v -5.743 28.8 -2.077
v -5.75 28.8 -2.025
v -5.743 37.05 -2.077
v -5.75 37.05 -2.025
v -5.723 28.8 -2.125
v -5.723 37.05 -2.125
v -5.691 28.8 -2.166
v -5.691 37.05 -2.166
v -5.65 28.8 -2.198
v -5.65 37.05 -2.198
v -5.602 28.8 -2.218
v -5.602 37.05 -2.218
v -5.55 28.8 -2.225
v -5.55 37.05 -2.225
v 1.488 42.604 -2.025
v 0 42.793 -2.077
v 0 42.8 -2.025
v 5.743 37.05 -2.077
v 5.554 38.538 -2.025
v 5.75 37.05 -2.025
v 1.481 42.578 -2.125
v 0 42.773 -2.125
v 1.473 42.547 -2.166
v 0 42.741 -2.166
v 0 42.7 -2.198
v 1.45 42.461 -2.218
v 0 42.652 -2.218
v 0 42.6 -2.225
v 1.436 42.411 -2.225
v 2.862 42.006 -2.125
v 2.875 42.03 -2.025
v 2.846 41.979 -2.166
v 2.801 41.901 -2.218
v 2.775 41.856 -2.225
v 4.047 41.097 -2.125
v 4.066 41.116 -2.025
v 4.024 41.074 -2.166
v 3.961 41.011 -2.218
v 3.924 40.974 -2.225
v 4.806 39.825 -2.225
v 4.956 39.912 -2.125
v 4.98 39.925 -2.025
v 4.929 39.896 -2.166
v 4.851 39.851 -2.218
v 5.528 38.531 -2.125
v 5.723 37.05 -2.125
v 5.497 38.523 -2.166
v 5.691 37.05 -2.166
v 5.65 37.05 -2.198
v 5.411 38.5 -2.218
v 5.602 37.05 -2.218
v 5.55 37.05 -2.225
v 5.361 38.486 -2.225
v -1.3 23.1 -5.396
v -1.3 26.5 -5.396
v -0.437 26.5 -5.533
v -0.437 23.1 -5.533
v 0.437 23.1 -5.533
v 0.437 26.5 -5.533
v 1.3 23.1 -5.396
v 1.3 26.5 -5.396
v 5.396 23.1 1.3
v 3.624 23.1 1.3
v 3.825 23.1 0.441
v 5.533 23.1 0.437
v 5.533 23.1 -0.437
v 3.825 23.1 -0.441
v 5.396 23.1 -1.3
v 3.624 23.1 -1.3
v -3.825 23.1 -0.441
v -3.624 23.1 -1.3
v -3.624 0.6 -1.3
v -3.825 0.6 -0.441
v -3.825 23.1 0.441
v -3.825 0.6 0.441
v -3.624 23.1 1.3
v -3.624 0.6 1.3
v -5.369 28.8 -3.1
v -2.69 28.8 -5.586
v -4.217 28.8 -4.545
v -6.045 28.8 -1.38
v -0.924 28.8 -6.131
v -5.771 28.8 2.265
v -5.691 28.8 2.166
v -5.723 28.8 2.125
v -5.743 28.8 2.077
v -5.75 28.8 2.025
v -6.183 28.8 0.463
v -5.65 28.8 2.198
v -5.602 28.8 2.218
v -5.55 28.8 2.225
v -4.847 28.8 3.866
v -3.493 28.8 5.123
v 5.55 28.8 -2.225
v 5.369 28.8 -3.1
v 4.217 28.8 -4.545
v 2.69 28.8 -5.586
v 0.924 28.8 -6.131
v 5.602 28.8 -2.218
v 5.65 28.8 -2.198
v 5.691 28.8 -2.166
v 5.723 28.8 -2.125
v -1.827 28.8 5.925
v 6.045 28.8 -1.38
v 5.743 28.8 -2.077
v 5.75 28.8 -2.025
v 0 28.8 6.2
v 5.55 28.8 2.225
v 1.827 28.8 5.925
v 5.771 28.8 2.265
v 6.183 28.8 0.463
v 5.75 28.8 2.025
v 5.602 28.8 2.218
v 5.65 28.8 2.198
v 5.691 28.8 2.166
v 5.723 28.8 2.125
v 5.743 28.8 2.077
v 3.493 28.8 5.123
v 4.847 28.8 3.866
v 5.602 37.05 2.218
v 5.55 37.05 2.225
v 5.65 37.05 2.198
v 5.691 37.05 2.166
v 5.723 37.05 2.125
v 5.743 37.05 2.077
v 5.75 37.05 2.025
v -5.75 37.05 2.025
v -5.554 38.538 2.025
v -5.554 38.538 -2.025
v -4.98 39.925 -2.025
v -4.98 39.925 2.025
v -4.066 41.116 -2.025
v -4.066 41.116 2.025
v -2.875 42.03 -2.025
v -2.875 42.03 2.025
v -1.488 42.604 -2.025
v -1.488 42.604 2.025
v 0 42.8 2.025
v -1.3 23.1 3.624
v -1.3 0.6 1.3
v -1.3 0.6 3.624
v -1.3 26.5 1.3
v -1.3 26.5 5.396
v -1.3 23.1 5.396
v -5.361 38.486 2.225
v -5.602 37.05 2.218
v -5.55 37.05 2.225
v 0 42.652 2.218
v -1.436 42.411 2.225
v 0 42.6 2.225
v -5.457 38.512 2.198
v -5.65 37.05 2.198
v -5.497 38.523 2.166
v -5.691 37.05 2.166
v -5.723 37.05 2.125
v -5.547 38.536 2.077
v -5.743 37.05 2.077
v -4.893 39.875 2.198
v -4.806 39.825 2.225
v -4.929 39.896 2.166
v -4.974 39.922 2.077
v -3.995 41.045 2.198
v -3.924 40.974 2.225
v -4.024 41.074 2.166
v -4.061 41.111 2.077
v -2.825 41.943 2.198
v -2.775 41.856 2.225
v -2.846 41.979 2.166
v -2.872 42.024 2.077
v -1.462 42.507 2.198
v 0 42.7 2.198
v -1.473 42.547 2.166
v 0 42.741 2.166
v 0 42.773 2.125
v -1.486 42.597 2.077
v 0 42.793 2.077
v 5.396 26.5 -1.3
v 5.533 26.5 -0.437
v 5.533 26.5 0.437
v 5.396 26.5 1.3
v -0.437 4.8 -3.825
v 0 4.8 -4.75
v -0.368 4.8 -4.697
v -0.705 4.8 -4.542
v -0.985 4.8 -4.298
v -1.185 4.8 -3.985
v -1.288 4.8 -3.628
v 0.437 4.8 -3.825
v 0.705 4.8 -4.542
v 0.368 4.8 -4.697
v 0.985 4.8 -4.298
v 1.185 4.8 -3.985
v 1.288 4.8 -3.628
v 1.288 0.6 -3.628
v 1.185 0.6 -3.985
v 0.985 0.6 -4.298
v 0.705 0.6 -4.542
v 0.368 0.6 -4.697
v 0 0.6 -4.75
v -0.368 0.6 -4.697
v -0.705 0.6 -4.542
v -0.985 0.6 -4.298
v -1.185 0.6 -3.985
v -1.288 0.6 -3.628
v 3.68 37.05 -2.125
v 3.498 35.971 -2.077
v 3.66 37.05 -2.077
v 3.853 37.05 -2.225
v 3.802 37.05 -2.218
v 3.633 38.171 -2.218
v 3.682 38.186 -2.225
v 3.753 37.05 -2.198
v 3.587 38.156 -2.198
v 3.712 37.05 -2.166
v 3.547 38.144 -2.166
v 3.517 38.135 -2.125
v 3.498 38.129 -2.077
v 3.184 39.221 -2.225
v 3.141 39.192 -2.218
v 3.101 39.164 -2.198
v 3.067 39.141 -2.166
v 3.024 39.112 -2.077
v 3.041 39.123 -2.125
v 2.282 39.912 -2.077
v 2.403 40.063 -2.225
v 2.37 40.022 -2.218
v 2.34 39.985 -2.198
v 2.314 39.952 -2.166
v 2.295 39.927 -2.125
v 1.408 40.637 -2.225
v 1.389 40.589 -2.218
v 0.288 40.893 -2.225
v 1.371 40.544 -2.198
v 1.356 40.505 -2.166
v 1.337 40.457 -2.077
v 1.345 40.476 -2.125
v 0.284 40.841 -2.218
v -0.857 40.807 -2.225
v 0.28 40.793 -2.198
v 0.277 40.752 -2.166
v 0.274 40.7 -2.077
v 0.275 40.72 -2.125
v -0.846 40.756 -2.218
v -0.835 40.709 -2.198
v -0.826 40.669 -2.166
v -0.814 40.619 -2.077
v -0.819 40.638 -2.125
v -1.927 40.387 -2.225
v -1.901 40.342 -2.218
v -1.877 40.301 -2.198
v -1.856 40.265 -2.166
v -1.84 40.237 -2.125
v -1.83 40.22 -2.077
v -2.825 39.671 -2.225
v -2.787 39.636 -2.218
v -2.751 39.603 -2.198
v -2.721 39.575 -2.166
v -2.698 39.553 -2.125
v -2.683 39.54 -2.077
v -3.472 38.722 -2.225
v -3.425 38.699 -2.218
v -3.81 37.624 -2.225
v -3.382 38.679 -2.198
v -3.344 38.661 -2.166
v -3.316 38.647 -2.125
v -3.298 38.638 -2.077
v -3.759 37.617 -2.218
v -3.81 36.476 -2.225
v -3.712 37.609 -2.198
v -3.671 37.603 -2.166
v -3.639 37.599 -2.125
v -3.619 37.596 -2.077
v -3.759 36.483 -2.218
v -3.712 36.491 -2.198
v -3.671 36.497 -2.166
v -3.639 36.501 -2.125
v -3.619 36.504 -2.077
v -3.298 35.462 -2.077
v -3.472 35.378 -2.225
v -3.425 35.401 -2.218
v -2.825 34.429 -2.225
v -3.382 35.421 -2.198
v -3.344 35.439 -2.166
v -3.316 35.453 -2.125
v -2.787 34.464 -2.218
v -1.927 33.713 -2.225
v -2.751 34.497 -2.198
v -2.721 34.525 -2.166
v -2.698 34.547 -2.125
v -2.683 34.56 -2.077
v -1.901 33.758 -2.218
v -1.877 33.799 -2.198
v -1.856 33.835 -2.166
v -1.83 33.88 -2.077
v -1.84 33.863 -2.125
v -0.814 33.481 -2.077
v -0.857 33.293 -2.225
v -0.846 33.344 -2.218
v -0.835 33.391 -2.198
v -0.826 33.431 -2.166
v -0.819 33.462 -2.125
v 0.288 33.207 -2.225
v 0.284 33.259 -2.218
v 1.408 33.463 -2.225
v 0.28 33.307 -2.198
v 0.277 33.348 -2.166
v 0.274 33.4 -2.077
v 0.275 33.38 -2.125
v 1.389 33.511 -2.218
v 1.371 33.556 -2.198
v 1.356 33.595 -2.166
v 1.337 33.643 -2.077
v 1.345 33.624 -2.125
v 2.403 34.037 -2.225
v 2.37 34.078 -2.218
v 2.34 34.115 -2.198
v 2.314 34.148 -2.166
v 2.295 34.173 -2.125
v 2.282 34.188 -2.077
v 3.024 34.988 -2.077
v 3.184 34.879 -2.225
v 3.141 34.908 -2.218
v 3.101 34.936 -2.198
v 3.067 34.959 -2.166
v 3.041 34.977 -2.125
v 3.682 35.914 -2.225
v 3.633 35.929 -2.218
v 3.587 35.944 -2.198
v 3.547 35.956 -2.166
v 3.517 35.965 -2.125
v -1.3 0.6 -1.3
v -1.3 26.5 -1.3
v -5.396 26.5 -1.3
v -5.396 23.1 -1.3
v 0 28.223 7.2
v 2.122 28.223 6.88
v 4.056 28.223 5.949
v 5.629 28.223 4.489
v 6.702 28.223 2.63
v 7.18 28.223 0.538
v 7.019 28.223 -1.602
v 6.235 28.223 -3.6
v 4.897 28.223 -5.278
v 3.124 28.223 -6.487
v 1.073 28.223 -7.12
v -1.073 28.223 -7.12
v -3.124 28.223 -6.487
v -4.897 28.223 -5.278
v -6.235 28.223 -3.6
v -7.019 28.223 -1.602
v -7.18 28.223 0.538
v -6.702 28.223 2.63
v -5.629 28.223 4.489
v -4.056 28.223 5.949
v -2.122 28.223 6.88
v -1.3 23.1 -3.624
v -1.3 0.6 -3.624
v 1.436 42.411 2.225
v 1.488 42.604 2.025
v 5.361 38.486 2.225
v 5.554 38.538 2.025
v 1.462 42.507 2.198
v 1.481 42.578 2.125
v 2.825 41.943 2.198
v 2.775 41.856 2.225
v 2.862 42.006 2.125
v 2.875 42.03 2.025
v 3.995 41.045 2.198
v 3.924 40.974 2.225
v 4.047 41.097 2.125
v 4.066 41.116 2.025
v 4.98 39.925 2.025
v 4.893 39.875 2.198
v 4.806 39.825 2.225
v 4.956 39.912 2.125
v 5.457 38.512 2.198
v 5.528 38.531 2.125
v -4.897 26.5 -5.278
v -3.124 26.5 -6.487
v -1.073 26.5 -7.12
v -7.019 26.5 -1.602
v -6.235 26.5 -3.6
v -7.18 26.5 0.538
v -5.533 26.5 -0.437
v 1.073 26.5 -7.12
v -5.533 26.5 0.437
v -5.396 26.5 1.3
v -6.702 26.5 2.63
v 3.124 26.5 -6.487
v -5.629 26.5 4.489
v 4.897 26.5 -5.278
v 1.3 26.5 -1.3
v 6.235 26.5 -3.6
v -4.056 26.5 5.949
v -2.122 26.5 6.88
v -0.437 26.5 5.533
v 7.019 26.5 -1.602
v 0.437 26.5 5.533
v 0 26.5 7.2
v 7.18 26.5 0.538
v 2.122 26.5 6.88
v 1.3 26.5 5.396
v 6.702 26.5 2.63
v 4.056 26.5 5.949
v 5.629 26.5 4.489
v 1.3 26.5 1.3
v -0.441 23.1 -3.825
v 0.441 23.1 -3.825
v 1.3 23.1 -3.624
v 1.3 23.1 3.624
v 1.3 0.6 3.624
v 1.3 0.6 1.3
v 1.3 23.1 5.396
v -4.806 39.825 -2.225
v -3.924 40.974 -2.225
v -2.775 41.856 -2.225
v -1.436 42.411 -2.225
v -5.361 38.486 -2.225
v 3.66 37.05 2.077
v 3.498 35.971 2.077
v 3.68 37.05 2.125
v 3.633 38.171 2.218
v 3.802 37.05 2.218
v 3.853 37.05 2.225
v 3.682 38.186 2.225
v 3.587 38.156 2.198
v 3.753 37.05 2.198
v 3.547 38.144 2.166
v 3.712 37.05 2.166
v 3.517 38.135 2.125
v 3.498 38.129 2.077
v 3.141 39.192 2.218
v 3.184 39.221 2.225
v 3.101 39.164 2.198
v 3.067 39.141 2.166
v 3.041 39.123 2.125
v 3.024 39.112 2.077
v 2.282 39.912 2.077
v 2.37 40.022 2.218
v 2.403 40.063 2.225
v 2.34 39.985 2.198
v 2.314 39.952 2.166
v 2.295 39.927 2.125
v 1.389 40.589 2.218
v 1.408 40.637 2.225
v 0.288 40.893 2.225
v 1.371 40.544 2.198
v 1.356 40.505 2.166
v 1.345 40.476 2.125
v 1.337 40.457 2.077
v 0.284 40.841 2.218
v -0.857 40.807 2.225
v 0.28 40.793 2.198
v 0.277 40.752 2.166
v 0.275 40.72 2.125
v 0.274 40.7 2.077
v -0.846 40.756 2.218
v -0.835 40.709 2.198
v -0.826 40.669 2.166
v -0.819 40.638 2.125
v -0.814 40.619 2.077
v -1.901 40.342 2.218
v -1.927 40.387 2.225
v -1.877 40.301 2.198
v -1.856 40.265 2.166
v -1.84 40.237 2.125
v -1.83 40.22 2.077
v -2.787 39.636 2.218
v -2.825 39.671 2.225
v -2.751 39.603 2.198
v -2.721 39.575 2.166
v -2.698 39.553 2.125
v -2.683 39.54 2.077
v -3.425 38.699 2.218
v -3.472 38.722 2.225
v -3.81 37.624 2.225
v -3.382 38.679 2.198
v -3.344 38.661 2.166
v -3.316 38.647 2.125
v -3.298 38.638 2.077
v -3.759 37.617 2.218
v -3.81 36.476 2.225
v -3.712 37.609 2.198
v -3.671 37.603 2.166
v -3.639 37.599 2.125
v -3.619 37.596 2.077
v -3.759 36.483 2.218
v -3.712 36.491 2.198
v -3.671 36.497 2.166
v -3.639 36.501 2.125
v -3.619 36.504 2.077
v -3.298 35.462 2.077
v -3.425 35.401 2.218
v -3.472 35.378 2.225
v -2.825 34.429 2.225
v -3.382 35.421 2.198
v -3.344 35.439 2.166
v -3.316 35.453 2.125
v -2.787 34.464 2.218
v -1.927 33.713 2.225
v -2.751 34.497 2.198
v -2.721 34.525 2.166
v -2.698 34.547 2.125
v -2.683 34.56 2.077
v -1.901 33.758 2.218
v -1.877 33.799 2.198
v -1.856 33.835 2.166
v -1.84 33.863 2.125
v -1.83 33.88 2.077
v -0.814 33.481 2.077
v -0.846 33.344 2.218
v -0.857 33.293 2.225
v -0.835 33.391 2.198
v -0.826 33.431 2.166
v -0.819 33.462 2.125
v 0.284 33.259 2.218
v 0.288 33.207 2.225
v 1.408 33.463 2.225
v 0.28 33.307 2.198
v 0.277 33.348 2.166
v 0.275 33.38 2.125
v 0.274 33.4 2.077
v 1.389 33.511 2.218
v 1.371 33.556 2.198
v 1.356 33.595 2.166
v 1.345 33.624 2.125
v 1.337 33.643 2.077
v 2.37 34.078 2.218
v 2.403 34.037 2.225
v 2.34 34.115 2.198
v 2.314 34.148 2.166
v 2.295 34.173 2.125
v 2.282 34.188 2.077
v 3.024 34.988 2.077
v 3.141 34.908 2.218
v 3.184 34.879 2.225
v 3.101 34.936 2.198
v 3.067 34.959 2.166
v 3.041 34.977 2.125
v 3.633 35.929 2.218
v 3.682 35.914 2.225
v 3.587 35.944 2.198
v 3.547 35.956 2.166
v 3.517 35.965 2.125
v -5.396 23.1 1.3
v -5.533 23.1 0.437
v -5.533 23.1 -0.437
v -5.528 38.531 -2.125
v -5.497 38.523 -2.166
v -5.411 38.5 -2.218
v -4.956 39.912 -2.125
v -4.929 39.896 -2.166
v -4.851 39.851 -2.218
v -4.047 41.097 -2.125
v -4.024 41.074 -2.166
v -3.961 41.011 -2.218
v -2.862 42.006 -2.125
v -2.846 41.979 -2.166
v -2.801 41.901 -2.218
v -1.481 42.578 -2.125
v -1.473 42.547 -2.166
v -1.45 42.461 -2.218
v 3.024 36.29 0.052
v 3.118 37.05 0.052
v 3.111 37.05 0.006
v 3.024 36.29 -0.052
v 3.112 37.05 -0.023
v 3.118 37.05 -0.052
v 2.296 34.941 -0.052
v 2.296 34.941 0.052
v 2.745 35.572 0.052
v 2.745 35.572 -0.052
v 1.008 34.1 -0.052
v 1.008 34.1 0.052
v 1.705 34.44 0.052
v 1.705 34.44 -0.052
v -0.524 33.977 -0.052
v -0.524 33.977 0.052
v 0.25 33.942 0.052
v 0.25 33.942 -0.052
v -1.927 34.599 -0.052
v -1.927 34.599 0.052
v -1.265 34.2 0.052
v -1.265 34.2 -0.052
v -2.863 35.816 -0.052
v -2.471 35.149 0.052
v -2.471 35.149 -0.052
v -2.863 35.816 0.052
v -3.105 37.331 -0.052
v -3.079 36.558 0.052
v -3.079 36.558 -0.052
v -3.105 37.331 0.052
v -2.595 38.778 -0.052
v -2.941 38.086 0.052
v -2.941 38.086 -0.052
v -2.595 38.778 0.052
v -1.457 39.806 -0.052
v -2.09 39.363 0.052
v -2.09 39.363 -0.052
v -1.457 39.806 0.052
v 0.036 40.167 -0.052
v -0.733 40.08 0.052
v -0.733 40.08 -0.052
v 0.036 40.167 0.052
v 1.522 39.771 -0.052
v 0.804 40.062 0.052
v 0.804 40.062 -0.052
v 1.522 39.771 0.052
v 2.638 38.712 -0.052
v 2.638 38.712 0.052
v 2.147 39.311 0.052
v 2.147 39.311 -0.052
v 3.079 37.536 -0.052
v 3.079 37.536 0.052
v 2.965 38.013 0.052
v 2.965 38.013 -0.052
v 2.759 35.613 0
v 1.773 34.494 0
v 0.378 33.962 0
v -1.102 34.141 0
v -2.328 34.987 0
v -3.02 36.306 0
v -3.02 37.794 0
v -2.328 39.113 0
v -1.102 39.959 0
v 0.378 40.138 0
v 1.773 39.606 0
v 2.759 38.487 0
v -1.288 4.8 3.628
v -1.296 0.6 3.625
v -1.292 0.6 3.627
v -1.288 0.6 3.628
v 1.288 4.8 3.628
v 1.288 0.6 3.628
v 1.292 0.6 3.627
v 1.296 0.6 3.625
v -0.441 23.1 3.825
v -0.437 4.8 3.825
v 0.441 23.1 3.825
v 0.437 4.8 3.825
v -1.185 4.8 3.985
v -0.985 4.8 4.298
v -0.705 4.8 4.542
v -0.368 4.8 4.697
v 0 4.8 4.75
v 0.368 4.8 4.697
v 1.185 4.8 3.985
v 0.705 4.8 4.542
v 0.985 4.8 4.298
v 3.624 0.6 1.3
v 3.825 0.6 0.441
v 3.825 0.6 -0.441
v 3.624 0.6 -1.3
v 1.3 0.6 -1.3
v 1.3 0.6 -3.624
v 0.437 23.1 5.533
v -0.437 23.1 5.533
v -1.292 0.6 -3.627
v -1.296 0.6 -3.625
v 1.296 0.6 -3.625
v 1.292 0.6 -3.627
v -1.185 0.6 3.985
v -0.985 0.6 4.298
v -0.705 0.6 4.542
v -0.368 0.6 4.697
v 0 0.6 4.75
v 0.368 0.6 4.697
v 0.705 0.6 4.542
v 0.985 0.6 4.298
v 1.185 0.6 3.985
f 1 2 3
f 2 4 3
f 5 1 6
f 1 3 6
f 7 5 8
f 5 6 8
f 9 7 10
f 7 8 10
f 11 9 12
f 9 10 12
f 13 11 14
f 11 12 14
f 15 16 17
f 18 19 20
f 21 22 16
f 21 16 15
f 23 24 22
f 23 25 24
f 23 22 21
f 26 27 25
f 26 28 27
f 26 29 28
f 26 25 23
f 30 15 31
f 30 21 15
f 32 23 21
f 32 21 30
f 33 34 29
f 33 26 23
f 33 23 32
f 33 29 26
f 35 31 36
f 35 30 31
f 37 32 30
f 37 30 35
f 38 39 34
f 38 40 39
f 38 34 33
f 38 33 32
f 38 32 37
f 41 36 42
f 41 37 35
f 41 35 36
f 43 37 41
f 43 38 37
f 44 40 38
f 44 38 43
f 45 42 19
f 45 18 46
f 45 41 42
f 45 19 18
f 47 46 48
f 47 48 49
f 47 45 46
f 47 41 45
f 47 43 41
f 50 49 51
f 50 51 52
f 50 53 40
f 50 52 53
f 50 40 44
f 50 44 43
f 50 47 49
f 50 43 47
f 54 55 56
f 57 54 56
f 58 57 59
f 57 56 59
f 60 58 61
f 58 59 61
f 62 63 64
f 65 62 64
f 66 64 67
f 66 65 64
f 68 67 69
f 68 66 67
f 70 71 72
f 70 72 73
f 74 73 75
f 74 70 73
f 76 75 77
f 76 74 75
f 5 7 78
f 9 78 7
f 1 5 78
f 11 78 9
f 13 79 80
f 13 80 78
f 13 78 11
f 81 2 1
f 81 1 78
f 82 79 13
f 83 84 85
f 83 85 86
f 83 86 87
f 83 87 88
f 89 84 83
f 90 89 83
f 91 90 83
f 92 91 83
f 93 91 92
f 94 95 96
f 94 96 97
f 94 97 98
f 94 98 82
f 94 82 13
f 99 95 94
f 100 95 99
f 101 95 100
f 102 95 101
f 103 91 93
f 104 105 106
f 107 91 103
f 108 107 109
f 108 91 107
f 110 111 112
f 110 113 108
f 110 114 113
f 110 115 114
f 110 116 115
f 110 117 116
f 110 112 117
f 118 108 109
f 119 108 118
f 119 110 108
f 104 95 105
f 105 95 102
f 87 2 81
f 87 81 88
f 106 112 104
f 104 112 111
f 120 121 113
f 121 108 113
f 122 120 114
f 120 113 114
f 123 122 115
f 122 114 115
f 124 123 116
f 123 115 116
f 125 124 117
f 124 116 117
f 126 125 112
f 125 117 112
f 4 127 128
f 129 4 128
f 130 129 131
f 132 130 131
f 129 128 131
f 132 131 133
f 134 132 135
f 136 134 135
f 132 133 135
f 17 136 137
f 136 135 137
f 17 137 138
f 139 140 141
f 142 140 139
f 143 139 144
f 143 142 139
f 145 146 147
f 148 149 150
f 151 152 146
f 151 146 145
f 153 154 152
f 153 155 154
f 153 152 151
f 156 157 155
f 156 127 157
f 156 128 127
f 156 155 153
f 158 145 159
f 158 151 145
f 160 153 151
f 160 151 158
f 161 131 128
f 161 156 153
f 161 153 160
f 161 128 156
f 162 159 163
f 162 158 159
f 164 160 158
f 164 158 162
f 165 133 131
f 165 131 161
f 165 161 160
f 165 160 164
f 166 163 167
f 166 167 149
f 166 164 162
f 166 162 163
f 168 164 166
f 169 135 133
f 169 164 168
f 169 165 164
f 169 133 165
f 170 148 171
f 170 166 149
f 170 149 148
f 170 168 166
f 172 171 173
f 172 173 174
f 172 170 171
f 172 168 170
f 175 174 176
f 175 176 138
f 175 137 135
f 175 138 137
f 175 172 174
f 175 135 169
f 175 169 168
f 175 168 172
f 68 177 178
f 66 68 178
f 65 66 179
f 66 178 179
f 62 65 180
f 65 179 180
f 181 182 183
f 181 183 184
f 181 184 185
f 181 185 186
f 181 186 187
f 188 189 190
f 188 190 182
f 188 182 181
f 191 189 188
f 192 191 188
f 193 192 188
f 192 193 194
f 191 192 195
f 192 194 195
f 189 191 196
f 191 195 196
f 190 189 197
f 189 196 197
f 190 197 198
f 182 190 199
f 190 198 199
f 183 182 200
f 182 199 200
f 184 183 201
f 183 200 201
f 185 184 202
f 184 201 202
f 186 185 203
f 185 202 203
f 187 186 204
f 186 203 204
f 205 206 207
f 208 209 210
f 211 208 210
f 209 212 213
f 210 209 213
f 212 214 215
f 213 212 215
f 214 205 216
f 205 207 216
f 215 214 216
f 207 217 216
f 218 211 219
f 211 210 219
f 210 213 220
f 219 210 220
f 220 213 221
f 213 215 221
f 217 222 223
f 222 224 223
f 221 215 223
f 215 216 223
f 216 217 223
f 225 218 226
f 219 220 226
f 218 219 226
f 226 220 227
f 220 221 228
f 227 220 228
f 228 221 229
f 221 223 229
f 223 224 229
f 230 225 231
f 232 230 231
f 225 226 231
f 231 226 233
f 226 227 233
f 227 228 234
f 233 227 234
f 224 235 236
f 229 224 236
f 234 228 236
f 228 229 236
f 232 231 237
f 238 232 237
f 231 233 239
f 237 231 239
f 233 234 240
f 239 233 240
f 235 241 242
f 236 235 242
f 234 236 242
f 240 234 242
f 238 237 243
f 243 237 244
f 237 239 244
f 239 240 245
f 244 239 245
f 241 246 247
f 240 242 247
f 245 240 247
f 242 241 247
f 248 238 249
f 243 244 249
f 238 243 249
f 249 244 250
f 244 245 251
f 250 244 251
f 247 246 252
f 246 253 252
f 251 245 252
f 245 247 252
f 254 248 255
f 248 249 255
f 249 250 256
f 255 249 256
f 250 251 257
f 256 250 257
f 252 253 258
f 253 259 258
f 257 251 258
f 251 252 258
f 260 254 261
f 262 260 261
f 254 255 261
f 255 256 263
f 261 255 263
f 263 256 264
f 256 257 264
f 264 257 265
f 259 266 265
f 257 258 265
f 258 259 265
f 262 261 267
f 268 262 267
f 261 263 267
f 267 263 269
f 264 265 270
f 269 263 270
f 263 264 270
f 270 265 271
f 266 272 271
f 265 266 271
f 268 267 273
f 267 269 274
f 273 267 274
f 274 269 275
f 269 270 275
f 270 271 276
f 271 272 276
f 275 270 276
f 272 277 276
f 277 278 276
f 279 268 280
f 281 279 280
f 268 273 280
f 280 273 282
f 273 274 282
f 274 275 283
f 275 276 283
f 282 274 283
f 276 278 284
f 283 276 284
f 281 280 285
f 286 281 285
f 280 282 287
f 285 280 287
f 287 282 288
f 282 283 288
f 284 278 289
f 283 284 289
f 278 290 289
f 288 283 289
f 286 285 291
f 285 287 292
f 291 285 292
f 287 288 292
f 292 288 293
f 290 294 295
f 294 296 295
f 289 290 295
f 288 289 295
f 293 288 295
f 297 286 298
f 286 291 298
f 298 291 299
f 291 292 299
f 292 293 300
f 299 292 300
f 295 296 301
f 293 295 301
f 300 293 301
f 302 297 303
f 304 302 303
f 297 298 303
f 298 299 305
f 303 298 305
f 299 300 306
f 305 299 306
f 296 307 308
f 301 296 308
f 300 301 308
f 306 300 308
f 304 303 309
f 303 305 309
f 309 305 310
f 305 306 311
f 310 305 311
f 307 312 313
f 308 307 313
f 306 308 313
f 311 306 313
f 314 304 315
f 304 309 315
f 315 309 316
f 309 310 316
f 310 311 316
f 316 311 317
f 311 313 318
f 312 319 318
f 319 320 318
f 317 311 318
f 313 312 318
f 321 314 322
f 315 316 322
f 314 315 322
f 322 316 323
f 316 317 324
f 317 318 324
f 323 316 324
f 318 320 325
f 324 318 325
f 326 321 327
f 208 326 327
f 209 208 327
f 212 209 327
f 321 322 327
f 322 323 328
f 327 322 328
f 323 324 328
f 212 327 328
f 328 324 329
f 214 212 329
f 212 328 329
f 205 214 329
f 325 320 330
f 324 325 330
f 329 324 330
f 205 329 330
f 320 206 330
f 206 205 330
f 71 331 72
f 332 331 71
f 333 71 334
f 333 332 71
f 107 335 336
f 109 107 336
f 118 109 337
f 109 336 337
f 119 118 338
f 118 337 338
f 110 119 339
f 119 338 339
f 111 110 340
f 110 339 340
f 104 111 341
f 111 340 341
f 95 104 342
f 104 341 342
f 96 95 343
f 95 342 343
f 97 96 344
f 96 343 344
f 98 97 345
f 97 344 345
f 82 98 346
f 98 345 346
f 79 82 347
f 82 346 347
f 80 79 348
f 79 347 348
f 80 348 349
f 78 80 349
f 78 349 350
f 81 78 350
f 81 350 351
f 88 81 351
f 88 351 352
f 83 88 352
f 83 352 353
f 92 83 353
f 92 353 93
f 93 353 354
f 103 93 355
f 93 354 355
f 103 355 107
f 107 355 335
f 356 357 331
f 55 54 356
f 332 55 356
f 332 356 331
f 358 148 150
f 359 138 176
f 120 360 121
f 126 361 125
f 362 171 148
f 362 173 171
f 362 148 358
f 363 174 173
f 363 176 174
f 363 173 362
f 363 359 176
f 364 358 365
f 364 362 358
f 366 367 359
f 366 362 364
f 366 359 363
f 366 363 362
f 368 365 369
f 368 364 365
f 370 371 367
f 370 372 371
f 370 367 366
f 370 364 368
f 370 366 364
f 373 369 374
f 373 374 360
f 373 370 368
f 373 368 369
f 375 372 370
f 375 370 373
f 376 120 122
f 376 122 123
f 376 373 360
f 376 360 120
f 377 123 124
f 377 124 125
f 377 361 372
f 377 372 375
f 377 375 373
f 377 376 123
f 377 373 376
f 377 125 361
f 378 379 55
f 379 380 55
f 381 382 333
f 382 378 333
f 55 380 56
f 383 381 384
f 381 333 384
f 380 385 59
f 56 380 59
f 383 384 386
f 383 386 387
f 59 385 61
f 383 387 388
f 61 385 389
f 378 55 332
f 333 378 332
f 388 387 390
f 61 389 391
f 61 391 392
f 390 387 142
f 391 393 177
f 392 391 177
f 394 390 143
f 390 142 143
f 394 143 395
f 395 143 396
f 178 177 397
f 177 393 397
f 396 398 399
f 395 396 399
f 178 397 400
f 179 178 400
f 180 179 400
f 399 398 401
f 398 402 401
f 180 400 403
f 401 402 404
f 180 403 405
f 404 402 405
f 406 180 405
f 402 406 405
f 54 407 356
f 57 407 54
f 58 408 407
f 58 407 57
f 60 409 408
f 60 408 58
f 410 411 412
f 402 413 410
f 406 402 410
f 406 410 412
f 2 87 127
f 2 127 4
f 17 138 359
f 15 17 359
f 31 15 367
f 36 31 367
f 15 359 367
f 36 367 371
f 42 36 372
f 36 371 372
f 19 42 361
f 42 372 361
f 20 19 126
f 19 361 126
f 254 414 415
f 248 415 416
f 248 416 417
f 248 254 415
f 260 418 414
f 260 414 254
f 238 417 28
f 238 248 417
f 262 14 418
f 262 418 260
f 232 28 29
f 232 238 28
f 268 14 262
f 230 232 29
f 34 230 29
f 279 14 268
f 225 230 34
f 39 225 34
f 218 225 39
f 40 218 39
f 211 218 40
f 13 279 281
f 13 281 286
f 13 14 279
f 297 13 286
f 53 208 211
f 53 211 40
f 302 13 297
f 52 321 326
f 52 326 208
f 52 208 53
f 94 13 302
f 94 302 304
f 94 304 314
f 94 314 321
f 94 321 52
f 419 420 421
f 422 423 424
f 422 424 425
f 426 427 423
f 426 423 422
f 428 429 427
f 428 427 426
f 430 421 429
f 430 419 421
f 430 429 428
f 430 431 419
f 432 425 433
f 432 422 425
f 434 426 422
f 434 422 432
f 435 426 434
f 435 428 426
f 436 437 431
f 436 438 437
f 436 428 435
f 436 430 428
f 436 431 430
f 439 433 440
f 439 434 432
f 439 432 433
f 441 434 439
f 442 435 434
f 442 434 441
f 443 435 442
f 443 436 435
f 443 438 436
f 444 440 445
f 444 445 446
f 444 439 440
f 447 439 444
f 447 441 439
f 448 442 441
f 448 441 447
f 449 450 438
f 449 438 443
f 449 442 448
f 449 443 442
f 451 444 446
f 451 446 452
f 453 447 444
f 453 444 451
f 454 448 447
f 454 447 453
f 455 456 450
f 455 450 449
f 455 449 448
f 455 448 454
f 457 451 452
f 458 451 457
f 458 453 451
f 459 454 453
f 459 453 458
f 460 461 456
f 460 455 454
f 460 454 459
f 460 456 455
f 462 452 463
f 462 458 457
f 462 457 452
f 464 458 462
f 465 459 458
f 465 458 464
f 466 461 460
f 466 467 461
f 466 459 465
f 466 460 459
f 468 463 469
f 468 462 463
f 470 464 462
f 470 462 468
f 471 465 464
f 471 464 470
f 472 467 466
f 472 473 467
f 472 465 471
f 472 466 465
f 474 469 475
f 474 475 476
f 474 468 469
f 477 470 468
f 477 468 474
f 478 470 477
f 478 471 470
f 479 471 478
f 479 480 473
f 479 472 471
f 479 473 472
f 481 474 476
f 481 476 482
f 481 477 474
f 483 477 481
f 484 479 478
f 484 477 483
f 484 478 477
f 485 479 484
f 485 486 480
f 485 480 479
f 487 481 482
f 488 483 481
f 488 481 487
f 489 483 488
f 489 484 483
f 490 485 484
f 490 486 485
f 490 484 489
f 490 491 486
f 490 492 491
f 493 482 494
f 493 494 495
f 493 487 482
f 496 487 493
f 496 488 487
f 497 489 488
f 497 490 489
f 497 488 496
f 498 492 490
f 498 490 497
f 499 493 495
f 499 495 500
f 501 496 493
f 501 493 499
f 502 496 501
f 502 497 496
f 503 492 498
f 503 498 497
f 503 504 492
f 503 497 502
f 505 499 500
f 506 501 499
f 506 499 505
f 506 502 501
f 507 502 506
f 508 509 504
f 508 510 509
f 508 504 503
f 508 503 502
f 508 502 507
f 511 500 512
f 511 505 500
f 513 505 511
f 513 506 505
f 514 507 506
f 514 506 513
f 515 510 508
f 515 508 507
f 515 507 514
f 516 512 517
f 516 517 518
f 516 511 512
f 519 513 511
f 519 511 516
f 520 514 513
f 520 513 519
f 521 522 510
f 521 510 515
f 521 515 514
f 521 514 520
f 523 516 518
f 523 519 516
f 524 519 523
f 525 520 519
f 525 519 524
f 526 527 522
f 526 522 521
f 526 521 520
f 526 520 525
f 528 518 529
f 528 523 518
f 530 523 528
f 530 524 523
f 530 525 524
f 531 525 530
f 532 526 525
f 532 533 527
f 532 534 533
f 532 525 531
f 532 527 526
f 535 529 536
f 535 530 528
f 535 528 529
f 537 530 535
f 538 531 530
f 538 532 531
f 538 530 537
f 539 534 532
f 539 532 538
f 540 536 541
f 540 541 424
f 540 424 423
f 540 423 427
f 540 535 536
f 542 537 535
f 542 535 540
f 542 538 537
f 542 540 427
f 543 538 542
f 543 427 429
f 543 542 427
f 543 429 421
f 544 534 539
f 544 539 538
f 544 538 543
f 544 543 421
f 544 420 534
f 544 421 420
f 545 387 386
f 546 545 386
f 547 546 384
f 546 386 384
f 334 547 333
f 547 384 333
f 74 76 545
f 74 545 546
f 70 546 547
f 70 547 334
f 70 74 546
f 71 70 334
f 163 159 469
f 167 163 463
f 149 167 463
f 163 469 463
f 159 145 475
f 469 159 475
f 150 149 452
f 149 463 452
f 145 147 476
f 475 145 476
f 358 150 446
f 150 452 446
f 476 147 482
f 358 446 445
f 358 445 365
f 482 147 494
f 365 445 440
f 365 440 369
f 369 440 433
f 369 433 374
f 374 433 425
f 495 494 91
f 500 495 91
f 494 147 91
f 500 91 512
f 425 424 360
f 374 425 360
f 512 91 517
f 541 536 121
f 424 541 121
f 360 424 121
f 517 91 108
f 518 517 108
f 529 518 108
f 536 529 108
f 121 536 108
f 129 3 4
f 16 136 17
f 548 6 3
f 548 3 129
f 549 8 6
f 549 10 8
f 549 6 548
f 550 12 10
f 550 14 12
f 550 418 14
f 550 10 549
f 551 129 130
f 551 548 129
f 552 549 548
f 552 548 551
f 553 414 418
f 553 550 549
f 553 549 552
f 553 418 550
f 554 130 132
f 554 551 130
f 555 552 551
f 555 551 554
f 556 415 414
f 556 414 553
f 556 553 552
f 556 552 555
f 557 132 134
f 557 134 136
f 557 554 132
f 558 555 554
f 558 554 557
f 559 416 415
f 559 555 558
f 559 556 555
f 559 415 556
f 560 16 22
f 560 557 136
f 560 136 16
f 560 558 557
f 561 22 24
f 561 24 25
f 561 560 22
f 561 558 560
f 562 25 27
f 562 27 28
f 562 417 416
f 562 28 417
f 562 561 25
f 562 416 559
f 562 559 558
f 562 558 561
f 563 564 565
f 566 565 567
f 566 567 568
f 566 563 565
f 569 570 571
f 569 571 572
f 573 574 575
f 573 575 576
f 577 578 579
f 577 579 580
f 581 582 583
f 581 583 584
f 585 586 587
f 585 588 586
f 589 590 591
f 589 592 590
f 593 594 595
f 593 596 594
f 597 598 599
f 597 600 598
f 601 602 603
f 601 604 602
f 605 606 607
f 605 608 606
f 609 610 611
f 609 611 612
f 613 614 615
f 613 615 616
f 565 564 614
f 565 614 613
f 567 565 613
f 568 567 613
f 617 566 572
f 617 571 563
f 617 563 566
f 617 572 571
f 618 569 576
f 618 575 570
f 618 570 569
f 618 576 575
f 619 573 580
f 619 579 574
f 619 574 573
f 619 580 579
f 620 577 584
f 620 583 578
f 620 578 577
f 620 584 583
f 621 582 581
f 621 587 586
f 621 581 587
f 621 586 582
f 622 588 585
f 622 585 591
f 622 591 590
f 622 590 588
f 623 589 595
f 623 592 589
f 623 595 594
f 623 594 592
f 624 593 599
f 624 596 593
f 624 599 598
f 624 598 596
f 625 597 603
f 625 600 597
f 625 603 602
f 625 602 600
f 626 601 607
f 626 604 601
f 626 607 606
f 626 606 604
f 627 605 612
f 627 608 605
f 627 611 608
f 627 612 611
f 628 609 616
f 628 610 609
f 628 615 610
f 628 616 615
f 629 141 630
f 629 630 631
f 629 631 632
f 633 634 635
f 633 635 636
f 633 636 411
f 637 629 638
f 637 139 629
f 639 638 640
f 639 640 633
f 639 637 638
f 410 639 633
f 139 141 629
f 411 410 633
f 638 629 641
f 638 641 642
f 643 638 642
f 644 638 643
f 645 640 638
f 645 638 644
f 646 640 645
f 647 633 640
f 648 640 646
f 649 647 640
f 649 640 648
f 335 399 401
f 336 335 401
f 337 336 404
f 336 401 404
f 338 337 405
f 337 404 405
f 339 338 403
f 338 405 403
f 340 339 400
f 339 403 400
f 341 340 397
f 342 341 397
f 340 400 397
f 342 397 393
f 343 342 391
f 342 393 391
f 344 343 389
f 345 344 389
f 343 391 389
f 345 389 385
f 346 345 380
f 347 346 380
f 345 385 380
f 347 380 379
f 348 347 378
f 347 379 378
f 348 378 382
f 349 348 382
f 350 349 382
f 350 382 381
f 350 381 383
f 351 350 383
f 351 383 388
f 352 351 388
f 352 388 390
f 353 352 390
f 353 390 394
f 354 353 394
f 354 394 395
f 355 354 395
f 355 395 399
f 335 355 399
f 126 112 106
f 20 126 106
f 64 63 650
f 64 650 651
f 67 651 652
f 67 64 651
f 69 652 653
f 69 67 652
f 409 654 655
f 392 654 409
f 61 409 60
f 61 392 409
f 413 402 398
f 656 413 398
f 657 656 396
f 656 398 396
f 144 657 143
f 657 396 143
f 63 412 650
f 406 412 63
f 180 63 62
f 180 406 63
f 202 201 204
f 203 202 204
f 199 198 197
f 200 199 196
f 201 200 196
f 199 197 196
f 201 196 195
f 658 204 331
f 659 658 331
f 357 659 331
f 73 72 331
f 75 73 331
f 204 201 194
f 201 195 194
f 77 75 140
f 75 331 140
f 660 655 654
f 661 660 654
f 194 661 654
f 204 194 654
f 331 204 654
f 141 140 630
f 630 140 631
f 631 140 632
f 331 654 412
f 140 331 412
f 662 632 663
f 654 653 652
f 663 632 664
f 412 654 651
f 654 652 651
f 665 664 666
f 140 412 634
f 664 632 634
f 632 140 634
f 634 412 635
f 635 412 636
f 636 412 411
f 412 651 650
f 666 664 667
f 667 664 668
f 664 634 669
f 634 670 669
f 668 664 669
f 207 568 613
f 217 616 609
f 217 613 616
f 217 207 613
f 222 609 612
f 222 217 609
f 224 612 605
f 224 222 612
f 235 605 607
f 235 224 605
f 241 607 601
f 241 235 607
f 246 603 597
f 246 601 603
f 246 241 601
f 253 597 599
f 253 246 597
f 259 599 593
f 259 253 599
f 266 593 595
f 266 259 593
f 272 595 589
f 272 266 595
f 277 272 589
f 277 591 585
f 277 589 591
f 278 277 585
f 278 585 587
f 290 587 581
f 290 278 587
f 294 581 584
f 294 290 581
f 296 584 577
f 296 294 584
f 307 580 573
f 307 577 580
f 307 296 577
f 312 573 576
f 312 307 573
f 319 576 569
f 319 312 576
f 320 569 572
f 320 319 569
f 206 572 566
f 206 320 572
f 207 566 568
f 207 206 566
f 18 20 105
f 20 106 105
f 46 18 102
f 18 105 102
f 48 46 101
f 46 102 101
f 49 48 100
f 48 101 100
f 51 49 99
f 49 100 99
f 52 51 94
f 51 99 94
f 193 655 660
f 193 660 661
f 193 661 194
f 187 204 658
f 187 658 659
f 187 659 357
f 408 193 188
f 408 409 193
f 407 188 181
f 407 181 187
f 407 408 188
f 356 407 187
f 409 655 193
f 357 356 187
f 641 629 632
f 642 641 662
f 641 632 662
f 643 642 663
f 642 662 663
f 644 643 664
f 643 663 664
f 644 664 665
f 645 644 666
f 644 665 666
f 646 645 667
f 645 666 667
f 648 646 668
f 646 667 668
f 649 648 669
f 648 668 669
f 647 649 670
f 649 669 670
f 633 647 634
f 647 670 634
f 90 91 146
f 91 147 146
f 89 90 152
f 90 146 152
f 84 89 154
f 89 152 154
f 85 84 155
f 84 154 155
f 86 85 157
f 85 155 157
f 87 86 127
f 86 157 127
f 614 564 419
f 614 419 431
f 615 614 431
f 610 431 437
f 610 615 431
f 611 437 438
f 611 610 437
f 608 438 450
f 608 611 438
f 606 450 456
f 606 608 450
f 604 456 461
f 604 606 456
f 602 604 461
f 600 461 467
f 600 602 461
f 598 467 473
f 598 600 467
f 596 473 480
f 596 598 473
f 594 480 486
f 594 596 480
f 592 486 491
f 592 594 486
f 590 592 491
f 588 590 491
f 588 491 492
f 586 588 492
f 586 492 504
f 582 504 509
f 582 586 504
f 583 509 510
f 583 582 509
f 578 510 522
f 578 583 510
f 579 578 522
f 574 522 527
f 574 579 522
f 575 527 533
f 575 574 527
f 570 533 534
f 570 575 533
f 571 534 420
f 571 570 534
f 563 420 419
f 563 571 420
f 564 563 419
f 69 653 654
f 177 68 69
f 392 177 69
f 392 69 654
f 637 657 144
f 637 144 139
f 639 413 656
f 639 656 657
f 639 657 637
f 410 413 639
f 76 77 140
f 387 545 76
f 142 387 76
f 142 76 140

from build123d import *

# Parameters (mm, degrees)
CROQUIS1_R                 = 5.5
SALIENTE_EXTRUIR1_DEPTH    = 26.5
CROQUIS2_R                 = 7.2
SALIENTE_EXTRUIR2_DEPTH    = 2.3
CROQUIS3_W                 = 11.5
CROQUIS3_H                 = 4.45
SALIENTE_EXTRUIR3_DEPTH    = 14
CORTAR_EXTRUIR1_DEPTH      = 13.37
CROQUIS6_R                 = 4
CORTAR_EXTRUIR2_DEPTH      = 26.5
CROQUIS7_R                 = 2.8
CORTAR_EXTRUIR3_DEPTH      = 26.37
CHAFL_N1_SIZE              = 0.9
CHAFL_N1_SIZE2             = 3.358845727
CHAFL_N2_SIZE              = 3.358845727
CHAFL_N2_SIZE_2            = 0.9
REDONDEO1_R                = 0.2
REDONDEO2_R                = 0.2
CROQUIS11_W                = 4
CROQUIS11_H                = 22.3
CORTAR_EXTRUIR4_DEPTH      = 48.550085436
CORTAR_EXTRUIR5_DEPTH      = 8.4
REDONDEO3_R                = 0.2
CROQUIS14_W                = 14.4
CROQUIS14_H                = 26.5
CORTAR_EXTRUIR6_DEPTH      = 28.4
SALIENTE_EXTRUIR4_DEPTH    = 3.4
SALIENTE_EXTRUIR5_DEPTH    = 22.5
SALIENTE_EXTRUIR6_DEPTH    = 4.2
CHAFL_N3_SIZE              = 1
CHAFL_N3_SIZE2             = 0.577350269
S_LIDO_MOVER_COPIAR1_ANGLE = 90


with BuildPart() as part:
    # Croquis1 → Saliente-Extruir1 (new body)
    with BuildSketch(Plane(origin=(0, 0, 0), x_dir=(1, 0, 0), z_dir=(0, 1, 0))):
        with Locations(Location((0, 0, 0), (0, 0, 270))):
            Circle(CROQUIS1_R)
    extrude(amount=SALIENTE_EXTRUIR1_DEPTH)

    # Croquis2 → Saliente-Extruir2 (add)
    with BuildSketch(Plane(origin=(0, 26.5, 0), x_dir=(1, 0, 0), z_dir=(0, 1, 0))):
        with Locations(Location((0, 0, 0), (0, 0, 270))):
            Circle(CROQUIS2_R)
    extrude(amount=SALIENTE_EXTRUIR2_DEPTH)

    # Croquis3 → Saliente-Extruir3 (add)
    with BuildSketch(Plane(origin=(0, 28.8, 0), x_dir=(1, 0, 0), z_dir=(0, 1, 0))):
        Rectangle(CROQUIS3_W, CROQUIS3_H)
    extrude(amount=SALIENTE_EXTRUIR3_DEPTH)

    # Croquis4 → Cortar-Extruir1 (cut)
    with BuildSketch(Plane.XY.offset(2.225)):
        with BuildLine():
            Line((5.75, 42.8), (0, 42.8))
            ThreePointArc((0, 42.8), (4.065863992, 41.115863992), (5.75, 37.05))
            Line((5.75, 37.05), (5.75, 42.8))
        make_face()
        with BuildLine():
            Line((0, 42.8), (-5.75, 42.8))
            Line((-5.75, 42.8), (-5.75, 37.05))
            ThreePointArc((-5.75, 37.05), (-4.065863992, 41.115863992), (0, 42.8))
        make_face()
    extrude(amount=-CORTAR_EXTRUIR1_DEPTH, mode=Mode.SUBTRACT)

    # Croquis6 → Cortar-Extruir2 (cut)
    with BuildSketch(Plane.XZ):
        with Locations(Location((0, 0, 0), (0, 0, 270))):
            Circle(CROQUIS6_R)
    extrude(amount=-CORTAR_EXTRUIR2_DEPTH, mode=Mode.SUBTRACT)

    # Croquis7 → Cortar-Extruir3 (cut)
    with BuildSketch(Plane.XY.offset(2.225)):
        with Locations((0, 37.05)):
            Circle(CROQUIS7_R)
    extrude(amount=-CORTAR_EXTRUIR3_DEPTH, mode=Mode.SUBTRACT)

    # Chaflán1
    chafl_n1_edges = [part.edges().sort_by_distance(p)[0] for p in [
        (-2.8, 37.05, 2.225),
    ]]
    chafl_n1_side = [part.faces().sort_by_distance(p)[0] for p in [
        (0, 28.981176709, 2.225),
    ]]
    chamfer(chafl_n1_edges, length=CHAFL_N1_SIZE, length2=CHAFL_N1_SIZE2, reference=chafl_n1_side[0])

    # Chaflán2
    # the kernel refuses this chamfer: 3.358845727, 0.9 mm, written as the material it takes off along each edge
    with BuildSketch(Plane(origin=(0, 37.05, -2.225), x_dir=(1, 0, 0), z_dir=(0, -1, 0))) as chafl_n2_piece_1:
        Polygon((2.8, CHAFL_N2_SIZE), (2.8 + CHAFL_N2_SIZE_2, 0), (2.8, 0), align=None)
    revolve(axis=Axis((0, 37.05, -2.225), (0, 0, 1)), mode=Mode.SUBTRACT)

    # Redondeo1
    redondeo1_edges = [part.edges().sort_by_distance(p)[0] for p in [
        (-5.75, 32.925, 2.225),
        (-5.75, 32.925, -2.225),
        (0, 42.8, 2.225),
        (0, 42.8, -2.225),
        (5.75, 32.925, -2.225),
        (5.75, 32.925, 2.225),
    ]]
    fillet(redondeo1_edges, radius=REDONDEO1_R)

    # Redondeo2
    redondeo2_edges = [part.edges().sort_by_distance(p)[0] for p in [
        (-3.7, 37.05, 2.225),
        (-3.7, 37.05, -2.225),
        (-3.103813047, 37.05, 0),
    ]]
    fillet(redondeo2_edges, radius=REDONDEO2_R)

    # Croquis11 → Cortar-Extruir4 (cut, through all)
    with BuildSketch(Plane.XY.offset(12.225)):
        with Locations((0, 15.35)):
            Rectangle(CROQUIS11_W, CROQUIS11_H)
    extrude(amount=-CORTAR_EXTRUIR4_DEPTH, mode=Mode.SUBTRACT)

    # Croquis13 → Cortar-Extruir5 (cut)
    with BuildSketch(Plane.XZ):
        with BuildLine():
            Line((-2, -4.19791615), (4.520060123, 1.091584394))
            ThreePointArc((4.520060123, 1.091584394), (3.611110666, 2.929569892), (2, 4.19791615))
            Line((2, 4.19791615), (-4.520060123, -1.091584394))
            ThreePointArc((-4.520060123, -1.091584394), (-3.611110666, -2.929569892), (-2, -4.19791615))
        make_face()
    extrude(amount=-CORTAR_EXTRUIR5_DEPTH, mode=Mode.SUBTRACT)

    # Redondeo3
    redondeo3_edges = [part.edges().sort_by_distance(p)[0] for p in [
        (-2, 4.2, -4.660695766),
        (-2, 4.2, 4.293788499),
        (-2, 26.5, -4.293788499),
        (-2, 26.5, 4.293788499),
        (2, 26.5, 4.293788499),
        (2, 26.5, -4.293788499),
        (2, 4.2, -4.293788499),
        (2, 4.2, 4.660695766),
    ]]
    fillet(redondeo3_edges, radius=REDONDEO3_R)

    # Croquis14 → Cortar-Extruir6 (cut)
    with BuildSketch(Plane(origin=(15.75, 0, 0), x_dir=(0, 0, -1), z_dir=(1, 0, 0))):
        with Locations((0, 13.25)):
            Rectangle(CROQUIS14_W, CROQUIS14_H)
    extrude(amount=-CORTAR_EXTRUIR6_DEPTH, mode=Mode.SUBTRACT)

    # Chaflán3
    chafl_n3_edges = [part.edges().sort_by_distance(p)[0] for p in [
        (0, 28.8, -7.2),
    ]]
    chafl_n3_side = [part.faces().sort_by_distance(p)[0] for p in [
        (-5.953646753, 28.8, 0),
    ]]
    chamfer(chafl_n3_edges, length=CHAFL_N3_SIZE, length2=CHAFL_N3_SIZE2, reference=chafl_n3_side[0])


with BuildPart() as body_2:
    # Croquis15 → Saliente-Extruir4 (new body)
    with BuildSketch(Plane.XZ.offset(-26.5)):
        with BuildLine():
            Line((-1.3, 5.395600059), (-1.3, 1.3))
            Line((-1.3, 1.3), (-5.395600059, 1.3))
            ThreePointArc((-5.395600059, 1.3), (-5.55, 0), (-5.395600059, -1.3))
            Line((-5.395600059, -1.3), (-1.3, -1.3))
            Line((-1.3, -1.3), (-1.3, -5.395600059))
            ThreePointArc((-1.3, -5.395600059), (0, -5.55), (1.3, -5.395600059))
            Line((1.3, -5.395600059), (1.3, -1.3))
            Line((1.3, -1.3), (5.395600059, -1.3))
            ThreePointArc((5.395600059, -1.3), (5.55, 0), (5.395600059, 1.3))
            Line((5.395600059, 1.3), (1.3, 1.3))
            Line((1.3, 1.3), (1.3, 5.395600059))
            ThreePointArc((1.3, 5.395600059), (0, 5.55), (-1.3, 5.395600059))
        make_face()
    extrude(amount=SALIENTE_EXTRUIR4_DEPTH)


with BuildPart() as body_3:
    # Croquis16 → Saliente-Extruir5 (new body)
    with BuildSketch(Plane.XZ.offset(-23.1)):
        with BuildLine():
            Line((-3.623879137, 1.3), (-1.3, 1.3))
            Line((-1.3, 1.3), (-1.3, 3.623879137))
            ThreePointArc((-1.3, 3.623879137), (0, 3.85), (1.3, 3.623879137))
            Line((1.3, 3.623879137), (1.3, 1.3))
            Line((1.3, 1.3), (3.623879137, 1.3))
            ThreePointArc((3.623879137, 1.3), (3.85, 0), (3.623879137, -1.3))
            Line((3.623879137, -1.3), (1.3, -1.3))
            Line((1.3, -1.3), (1.3, -3.623879137))
            ThreePointArc((1.3, -3.623879137), (0, -3.85), (-1.3, -3.623879137))
            Line((-1.3, -3.623879137), (-1.3, -1.3))
            Line((-1.3, -1.3), (-3.623879137, -1.3))
            ThreePointArc((-3.623879137, -1.3), (-3.85, 0), (-3.623879137, 1.3))
        make_face()
    extrude(amount=SALIENTE_EXTRUIR5_DEPTH)


with BuildPart() as body_4:
    # Croquis17 → Saliente-Extruir6 (new body)
    with BuildSketch(Plane.XZ.offset(-0.6)):
        with BuildLine():
            Line((-3.45, 1.3), (3.45, 1.3))
            ThreePointArc((3.45, 1.3), (4.75, 0), (3.45, -1.3))
            Line((3.45, -1.3), (-3.45, -1.3))
            ThreePointArc((-3.45, -1.3), (-4.75, 0), (-3.45, 1.3))
        make_face()
    extrude(amount=-SALIENTE_EXTRUIR6_DEPTH)


with BuildPart() as body_3_1:
    add(body_3.part)

    # Combinar1: union body 4
    add(body_4.part)


with BuildPart() as body_2_1:
    add(body_2.part)

    # Combinar2: union body 3
    add(body_3_1.part)


with BuildPart() as body_2_2:
    # Sólido-Mover/Copiar1: moved
    add(body_2_1.part.rotate(Axis((0, 0, 0), (0, 1, 0)), S_LIDO_MOVER_COPIAR1_ANGLE))

    # Combinar3: union part
    add(part.part)


solid = body_2_2.part
